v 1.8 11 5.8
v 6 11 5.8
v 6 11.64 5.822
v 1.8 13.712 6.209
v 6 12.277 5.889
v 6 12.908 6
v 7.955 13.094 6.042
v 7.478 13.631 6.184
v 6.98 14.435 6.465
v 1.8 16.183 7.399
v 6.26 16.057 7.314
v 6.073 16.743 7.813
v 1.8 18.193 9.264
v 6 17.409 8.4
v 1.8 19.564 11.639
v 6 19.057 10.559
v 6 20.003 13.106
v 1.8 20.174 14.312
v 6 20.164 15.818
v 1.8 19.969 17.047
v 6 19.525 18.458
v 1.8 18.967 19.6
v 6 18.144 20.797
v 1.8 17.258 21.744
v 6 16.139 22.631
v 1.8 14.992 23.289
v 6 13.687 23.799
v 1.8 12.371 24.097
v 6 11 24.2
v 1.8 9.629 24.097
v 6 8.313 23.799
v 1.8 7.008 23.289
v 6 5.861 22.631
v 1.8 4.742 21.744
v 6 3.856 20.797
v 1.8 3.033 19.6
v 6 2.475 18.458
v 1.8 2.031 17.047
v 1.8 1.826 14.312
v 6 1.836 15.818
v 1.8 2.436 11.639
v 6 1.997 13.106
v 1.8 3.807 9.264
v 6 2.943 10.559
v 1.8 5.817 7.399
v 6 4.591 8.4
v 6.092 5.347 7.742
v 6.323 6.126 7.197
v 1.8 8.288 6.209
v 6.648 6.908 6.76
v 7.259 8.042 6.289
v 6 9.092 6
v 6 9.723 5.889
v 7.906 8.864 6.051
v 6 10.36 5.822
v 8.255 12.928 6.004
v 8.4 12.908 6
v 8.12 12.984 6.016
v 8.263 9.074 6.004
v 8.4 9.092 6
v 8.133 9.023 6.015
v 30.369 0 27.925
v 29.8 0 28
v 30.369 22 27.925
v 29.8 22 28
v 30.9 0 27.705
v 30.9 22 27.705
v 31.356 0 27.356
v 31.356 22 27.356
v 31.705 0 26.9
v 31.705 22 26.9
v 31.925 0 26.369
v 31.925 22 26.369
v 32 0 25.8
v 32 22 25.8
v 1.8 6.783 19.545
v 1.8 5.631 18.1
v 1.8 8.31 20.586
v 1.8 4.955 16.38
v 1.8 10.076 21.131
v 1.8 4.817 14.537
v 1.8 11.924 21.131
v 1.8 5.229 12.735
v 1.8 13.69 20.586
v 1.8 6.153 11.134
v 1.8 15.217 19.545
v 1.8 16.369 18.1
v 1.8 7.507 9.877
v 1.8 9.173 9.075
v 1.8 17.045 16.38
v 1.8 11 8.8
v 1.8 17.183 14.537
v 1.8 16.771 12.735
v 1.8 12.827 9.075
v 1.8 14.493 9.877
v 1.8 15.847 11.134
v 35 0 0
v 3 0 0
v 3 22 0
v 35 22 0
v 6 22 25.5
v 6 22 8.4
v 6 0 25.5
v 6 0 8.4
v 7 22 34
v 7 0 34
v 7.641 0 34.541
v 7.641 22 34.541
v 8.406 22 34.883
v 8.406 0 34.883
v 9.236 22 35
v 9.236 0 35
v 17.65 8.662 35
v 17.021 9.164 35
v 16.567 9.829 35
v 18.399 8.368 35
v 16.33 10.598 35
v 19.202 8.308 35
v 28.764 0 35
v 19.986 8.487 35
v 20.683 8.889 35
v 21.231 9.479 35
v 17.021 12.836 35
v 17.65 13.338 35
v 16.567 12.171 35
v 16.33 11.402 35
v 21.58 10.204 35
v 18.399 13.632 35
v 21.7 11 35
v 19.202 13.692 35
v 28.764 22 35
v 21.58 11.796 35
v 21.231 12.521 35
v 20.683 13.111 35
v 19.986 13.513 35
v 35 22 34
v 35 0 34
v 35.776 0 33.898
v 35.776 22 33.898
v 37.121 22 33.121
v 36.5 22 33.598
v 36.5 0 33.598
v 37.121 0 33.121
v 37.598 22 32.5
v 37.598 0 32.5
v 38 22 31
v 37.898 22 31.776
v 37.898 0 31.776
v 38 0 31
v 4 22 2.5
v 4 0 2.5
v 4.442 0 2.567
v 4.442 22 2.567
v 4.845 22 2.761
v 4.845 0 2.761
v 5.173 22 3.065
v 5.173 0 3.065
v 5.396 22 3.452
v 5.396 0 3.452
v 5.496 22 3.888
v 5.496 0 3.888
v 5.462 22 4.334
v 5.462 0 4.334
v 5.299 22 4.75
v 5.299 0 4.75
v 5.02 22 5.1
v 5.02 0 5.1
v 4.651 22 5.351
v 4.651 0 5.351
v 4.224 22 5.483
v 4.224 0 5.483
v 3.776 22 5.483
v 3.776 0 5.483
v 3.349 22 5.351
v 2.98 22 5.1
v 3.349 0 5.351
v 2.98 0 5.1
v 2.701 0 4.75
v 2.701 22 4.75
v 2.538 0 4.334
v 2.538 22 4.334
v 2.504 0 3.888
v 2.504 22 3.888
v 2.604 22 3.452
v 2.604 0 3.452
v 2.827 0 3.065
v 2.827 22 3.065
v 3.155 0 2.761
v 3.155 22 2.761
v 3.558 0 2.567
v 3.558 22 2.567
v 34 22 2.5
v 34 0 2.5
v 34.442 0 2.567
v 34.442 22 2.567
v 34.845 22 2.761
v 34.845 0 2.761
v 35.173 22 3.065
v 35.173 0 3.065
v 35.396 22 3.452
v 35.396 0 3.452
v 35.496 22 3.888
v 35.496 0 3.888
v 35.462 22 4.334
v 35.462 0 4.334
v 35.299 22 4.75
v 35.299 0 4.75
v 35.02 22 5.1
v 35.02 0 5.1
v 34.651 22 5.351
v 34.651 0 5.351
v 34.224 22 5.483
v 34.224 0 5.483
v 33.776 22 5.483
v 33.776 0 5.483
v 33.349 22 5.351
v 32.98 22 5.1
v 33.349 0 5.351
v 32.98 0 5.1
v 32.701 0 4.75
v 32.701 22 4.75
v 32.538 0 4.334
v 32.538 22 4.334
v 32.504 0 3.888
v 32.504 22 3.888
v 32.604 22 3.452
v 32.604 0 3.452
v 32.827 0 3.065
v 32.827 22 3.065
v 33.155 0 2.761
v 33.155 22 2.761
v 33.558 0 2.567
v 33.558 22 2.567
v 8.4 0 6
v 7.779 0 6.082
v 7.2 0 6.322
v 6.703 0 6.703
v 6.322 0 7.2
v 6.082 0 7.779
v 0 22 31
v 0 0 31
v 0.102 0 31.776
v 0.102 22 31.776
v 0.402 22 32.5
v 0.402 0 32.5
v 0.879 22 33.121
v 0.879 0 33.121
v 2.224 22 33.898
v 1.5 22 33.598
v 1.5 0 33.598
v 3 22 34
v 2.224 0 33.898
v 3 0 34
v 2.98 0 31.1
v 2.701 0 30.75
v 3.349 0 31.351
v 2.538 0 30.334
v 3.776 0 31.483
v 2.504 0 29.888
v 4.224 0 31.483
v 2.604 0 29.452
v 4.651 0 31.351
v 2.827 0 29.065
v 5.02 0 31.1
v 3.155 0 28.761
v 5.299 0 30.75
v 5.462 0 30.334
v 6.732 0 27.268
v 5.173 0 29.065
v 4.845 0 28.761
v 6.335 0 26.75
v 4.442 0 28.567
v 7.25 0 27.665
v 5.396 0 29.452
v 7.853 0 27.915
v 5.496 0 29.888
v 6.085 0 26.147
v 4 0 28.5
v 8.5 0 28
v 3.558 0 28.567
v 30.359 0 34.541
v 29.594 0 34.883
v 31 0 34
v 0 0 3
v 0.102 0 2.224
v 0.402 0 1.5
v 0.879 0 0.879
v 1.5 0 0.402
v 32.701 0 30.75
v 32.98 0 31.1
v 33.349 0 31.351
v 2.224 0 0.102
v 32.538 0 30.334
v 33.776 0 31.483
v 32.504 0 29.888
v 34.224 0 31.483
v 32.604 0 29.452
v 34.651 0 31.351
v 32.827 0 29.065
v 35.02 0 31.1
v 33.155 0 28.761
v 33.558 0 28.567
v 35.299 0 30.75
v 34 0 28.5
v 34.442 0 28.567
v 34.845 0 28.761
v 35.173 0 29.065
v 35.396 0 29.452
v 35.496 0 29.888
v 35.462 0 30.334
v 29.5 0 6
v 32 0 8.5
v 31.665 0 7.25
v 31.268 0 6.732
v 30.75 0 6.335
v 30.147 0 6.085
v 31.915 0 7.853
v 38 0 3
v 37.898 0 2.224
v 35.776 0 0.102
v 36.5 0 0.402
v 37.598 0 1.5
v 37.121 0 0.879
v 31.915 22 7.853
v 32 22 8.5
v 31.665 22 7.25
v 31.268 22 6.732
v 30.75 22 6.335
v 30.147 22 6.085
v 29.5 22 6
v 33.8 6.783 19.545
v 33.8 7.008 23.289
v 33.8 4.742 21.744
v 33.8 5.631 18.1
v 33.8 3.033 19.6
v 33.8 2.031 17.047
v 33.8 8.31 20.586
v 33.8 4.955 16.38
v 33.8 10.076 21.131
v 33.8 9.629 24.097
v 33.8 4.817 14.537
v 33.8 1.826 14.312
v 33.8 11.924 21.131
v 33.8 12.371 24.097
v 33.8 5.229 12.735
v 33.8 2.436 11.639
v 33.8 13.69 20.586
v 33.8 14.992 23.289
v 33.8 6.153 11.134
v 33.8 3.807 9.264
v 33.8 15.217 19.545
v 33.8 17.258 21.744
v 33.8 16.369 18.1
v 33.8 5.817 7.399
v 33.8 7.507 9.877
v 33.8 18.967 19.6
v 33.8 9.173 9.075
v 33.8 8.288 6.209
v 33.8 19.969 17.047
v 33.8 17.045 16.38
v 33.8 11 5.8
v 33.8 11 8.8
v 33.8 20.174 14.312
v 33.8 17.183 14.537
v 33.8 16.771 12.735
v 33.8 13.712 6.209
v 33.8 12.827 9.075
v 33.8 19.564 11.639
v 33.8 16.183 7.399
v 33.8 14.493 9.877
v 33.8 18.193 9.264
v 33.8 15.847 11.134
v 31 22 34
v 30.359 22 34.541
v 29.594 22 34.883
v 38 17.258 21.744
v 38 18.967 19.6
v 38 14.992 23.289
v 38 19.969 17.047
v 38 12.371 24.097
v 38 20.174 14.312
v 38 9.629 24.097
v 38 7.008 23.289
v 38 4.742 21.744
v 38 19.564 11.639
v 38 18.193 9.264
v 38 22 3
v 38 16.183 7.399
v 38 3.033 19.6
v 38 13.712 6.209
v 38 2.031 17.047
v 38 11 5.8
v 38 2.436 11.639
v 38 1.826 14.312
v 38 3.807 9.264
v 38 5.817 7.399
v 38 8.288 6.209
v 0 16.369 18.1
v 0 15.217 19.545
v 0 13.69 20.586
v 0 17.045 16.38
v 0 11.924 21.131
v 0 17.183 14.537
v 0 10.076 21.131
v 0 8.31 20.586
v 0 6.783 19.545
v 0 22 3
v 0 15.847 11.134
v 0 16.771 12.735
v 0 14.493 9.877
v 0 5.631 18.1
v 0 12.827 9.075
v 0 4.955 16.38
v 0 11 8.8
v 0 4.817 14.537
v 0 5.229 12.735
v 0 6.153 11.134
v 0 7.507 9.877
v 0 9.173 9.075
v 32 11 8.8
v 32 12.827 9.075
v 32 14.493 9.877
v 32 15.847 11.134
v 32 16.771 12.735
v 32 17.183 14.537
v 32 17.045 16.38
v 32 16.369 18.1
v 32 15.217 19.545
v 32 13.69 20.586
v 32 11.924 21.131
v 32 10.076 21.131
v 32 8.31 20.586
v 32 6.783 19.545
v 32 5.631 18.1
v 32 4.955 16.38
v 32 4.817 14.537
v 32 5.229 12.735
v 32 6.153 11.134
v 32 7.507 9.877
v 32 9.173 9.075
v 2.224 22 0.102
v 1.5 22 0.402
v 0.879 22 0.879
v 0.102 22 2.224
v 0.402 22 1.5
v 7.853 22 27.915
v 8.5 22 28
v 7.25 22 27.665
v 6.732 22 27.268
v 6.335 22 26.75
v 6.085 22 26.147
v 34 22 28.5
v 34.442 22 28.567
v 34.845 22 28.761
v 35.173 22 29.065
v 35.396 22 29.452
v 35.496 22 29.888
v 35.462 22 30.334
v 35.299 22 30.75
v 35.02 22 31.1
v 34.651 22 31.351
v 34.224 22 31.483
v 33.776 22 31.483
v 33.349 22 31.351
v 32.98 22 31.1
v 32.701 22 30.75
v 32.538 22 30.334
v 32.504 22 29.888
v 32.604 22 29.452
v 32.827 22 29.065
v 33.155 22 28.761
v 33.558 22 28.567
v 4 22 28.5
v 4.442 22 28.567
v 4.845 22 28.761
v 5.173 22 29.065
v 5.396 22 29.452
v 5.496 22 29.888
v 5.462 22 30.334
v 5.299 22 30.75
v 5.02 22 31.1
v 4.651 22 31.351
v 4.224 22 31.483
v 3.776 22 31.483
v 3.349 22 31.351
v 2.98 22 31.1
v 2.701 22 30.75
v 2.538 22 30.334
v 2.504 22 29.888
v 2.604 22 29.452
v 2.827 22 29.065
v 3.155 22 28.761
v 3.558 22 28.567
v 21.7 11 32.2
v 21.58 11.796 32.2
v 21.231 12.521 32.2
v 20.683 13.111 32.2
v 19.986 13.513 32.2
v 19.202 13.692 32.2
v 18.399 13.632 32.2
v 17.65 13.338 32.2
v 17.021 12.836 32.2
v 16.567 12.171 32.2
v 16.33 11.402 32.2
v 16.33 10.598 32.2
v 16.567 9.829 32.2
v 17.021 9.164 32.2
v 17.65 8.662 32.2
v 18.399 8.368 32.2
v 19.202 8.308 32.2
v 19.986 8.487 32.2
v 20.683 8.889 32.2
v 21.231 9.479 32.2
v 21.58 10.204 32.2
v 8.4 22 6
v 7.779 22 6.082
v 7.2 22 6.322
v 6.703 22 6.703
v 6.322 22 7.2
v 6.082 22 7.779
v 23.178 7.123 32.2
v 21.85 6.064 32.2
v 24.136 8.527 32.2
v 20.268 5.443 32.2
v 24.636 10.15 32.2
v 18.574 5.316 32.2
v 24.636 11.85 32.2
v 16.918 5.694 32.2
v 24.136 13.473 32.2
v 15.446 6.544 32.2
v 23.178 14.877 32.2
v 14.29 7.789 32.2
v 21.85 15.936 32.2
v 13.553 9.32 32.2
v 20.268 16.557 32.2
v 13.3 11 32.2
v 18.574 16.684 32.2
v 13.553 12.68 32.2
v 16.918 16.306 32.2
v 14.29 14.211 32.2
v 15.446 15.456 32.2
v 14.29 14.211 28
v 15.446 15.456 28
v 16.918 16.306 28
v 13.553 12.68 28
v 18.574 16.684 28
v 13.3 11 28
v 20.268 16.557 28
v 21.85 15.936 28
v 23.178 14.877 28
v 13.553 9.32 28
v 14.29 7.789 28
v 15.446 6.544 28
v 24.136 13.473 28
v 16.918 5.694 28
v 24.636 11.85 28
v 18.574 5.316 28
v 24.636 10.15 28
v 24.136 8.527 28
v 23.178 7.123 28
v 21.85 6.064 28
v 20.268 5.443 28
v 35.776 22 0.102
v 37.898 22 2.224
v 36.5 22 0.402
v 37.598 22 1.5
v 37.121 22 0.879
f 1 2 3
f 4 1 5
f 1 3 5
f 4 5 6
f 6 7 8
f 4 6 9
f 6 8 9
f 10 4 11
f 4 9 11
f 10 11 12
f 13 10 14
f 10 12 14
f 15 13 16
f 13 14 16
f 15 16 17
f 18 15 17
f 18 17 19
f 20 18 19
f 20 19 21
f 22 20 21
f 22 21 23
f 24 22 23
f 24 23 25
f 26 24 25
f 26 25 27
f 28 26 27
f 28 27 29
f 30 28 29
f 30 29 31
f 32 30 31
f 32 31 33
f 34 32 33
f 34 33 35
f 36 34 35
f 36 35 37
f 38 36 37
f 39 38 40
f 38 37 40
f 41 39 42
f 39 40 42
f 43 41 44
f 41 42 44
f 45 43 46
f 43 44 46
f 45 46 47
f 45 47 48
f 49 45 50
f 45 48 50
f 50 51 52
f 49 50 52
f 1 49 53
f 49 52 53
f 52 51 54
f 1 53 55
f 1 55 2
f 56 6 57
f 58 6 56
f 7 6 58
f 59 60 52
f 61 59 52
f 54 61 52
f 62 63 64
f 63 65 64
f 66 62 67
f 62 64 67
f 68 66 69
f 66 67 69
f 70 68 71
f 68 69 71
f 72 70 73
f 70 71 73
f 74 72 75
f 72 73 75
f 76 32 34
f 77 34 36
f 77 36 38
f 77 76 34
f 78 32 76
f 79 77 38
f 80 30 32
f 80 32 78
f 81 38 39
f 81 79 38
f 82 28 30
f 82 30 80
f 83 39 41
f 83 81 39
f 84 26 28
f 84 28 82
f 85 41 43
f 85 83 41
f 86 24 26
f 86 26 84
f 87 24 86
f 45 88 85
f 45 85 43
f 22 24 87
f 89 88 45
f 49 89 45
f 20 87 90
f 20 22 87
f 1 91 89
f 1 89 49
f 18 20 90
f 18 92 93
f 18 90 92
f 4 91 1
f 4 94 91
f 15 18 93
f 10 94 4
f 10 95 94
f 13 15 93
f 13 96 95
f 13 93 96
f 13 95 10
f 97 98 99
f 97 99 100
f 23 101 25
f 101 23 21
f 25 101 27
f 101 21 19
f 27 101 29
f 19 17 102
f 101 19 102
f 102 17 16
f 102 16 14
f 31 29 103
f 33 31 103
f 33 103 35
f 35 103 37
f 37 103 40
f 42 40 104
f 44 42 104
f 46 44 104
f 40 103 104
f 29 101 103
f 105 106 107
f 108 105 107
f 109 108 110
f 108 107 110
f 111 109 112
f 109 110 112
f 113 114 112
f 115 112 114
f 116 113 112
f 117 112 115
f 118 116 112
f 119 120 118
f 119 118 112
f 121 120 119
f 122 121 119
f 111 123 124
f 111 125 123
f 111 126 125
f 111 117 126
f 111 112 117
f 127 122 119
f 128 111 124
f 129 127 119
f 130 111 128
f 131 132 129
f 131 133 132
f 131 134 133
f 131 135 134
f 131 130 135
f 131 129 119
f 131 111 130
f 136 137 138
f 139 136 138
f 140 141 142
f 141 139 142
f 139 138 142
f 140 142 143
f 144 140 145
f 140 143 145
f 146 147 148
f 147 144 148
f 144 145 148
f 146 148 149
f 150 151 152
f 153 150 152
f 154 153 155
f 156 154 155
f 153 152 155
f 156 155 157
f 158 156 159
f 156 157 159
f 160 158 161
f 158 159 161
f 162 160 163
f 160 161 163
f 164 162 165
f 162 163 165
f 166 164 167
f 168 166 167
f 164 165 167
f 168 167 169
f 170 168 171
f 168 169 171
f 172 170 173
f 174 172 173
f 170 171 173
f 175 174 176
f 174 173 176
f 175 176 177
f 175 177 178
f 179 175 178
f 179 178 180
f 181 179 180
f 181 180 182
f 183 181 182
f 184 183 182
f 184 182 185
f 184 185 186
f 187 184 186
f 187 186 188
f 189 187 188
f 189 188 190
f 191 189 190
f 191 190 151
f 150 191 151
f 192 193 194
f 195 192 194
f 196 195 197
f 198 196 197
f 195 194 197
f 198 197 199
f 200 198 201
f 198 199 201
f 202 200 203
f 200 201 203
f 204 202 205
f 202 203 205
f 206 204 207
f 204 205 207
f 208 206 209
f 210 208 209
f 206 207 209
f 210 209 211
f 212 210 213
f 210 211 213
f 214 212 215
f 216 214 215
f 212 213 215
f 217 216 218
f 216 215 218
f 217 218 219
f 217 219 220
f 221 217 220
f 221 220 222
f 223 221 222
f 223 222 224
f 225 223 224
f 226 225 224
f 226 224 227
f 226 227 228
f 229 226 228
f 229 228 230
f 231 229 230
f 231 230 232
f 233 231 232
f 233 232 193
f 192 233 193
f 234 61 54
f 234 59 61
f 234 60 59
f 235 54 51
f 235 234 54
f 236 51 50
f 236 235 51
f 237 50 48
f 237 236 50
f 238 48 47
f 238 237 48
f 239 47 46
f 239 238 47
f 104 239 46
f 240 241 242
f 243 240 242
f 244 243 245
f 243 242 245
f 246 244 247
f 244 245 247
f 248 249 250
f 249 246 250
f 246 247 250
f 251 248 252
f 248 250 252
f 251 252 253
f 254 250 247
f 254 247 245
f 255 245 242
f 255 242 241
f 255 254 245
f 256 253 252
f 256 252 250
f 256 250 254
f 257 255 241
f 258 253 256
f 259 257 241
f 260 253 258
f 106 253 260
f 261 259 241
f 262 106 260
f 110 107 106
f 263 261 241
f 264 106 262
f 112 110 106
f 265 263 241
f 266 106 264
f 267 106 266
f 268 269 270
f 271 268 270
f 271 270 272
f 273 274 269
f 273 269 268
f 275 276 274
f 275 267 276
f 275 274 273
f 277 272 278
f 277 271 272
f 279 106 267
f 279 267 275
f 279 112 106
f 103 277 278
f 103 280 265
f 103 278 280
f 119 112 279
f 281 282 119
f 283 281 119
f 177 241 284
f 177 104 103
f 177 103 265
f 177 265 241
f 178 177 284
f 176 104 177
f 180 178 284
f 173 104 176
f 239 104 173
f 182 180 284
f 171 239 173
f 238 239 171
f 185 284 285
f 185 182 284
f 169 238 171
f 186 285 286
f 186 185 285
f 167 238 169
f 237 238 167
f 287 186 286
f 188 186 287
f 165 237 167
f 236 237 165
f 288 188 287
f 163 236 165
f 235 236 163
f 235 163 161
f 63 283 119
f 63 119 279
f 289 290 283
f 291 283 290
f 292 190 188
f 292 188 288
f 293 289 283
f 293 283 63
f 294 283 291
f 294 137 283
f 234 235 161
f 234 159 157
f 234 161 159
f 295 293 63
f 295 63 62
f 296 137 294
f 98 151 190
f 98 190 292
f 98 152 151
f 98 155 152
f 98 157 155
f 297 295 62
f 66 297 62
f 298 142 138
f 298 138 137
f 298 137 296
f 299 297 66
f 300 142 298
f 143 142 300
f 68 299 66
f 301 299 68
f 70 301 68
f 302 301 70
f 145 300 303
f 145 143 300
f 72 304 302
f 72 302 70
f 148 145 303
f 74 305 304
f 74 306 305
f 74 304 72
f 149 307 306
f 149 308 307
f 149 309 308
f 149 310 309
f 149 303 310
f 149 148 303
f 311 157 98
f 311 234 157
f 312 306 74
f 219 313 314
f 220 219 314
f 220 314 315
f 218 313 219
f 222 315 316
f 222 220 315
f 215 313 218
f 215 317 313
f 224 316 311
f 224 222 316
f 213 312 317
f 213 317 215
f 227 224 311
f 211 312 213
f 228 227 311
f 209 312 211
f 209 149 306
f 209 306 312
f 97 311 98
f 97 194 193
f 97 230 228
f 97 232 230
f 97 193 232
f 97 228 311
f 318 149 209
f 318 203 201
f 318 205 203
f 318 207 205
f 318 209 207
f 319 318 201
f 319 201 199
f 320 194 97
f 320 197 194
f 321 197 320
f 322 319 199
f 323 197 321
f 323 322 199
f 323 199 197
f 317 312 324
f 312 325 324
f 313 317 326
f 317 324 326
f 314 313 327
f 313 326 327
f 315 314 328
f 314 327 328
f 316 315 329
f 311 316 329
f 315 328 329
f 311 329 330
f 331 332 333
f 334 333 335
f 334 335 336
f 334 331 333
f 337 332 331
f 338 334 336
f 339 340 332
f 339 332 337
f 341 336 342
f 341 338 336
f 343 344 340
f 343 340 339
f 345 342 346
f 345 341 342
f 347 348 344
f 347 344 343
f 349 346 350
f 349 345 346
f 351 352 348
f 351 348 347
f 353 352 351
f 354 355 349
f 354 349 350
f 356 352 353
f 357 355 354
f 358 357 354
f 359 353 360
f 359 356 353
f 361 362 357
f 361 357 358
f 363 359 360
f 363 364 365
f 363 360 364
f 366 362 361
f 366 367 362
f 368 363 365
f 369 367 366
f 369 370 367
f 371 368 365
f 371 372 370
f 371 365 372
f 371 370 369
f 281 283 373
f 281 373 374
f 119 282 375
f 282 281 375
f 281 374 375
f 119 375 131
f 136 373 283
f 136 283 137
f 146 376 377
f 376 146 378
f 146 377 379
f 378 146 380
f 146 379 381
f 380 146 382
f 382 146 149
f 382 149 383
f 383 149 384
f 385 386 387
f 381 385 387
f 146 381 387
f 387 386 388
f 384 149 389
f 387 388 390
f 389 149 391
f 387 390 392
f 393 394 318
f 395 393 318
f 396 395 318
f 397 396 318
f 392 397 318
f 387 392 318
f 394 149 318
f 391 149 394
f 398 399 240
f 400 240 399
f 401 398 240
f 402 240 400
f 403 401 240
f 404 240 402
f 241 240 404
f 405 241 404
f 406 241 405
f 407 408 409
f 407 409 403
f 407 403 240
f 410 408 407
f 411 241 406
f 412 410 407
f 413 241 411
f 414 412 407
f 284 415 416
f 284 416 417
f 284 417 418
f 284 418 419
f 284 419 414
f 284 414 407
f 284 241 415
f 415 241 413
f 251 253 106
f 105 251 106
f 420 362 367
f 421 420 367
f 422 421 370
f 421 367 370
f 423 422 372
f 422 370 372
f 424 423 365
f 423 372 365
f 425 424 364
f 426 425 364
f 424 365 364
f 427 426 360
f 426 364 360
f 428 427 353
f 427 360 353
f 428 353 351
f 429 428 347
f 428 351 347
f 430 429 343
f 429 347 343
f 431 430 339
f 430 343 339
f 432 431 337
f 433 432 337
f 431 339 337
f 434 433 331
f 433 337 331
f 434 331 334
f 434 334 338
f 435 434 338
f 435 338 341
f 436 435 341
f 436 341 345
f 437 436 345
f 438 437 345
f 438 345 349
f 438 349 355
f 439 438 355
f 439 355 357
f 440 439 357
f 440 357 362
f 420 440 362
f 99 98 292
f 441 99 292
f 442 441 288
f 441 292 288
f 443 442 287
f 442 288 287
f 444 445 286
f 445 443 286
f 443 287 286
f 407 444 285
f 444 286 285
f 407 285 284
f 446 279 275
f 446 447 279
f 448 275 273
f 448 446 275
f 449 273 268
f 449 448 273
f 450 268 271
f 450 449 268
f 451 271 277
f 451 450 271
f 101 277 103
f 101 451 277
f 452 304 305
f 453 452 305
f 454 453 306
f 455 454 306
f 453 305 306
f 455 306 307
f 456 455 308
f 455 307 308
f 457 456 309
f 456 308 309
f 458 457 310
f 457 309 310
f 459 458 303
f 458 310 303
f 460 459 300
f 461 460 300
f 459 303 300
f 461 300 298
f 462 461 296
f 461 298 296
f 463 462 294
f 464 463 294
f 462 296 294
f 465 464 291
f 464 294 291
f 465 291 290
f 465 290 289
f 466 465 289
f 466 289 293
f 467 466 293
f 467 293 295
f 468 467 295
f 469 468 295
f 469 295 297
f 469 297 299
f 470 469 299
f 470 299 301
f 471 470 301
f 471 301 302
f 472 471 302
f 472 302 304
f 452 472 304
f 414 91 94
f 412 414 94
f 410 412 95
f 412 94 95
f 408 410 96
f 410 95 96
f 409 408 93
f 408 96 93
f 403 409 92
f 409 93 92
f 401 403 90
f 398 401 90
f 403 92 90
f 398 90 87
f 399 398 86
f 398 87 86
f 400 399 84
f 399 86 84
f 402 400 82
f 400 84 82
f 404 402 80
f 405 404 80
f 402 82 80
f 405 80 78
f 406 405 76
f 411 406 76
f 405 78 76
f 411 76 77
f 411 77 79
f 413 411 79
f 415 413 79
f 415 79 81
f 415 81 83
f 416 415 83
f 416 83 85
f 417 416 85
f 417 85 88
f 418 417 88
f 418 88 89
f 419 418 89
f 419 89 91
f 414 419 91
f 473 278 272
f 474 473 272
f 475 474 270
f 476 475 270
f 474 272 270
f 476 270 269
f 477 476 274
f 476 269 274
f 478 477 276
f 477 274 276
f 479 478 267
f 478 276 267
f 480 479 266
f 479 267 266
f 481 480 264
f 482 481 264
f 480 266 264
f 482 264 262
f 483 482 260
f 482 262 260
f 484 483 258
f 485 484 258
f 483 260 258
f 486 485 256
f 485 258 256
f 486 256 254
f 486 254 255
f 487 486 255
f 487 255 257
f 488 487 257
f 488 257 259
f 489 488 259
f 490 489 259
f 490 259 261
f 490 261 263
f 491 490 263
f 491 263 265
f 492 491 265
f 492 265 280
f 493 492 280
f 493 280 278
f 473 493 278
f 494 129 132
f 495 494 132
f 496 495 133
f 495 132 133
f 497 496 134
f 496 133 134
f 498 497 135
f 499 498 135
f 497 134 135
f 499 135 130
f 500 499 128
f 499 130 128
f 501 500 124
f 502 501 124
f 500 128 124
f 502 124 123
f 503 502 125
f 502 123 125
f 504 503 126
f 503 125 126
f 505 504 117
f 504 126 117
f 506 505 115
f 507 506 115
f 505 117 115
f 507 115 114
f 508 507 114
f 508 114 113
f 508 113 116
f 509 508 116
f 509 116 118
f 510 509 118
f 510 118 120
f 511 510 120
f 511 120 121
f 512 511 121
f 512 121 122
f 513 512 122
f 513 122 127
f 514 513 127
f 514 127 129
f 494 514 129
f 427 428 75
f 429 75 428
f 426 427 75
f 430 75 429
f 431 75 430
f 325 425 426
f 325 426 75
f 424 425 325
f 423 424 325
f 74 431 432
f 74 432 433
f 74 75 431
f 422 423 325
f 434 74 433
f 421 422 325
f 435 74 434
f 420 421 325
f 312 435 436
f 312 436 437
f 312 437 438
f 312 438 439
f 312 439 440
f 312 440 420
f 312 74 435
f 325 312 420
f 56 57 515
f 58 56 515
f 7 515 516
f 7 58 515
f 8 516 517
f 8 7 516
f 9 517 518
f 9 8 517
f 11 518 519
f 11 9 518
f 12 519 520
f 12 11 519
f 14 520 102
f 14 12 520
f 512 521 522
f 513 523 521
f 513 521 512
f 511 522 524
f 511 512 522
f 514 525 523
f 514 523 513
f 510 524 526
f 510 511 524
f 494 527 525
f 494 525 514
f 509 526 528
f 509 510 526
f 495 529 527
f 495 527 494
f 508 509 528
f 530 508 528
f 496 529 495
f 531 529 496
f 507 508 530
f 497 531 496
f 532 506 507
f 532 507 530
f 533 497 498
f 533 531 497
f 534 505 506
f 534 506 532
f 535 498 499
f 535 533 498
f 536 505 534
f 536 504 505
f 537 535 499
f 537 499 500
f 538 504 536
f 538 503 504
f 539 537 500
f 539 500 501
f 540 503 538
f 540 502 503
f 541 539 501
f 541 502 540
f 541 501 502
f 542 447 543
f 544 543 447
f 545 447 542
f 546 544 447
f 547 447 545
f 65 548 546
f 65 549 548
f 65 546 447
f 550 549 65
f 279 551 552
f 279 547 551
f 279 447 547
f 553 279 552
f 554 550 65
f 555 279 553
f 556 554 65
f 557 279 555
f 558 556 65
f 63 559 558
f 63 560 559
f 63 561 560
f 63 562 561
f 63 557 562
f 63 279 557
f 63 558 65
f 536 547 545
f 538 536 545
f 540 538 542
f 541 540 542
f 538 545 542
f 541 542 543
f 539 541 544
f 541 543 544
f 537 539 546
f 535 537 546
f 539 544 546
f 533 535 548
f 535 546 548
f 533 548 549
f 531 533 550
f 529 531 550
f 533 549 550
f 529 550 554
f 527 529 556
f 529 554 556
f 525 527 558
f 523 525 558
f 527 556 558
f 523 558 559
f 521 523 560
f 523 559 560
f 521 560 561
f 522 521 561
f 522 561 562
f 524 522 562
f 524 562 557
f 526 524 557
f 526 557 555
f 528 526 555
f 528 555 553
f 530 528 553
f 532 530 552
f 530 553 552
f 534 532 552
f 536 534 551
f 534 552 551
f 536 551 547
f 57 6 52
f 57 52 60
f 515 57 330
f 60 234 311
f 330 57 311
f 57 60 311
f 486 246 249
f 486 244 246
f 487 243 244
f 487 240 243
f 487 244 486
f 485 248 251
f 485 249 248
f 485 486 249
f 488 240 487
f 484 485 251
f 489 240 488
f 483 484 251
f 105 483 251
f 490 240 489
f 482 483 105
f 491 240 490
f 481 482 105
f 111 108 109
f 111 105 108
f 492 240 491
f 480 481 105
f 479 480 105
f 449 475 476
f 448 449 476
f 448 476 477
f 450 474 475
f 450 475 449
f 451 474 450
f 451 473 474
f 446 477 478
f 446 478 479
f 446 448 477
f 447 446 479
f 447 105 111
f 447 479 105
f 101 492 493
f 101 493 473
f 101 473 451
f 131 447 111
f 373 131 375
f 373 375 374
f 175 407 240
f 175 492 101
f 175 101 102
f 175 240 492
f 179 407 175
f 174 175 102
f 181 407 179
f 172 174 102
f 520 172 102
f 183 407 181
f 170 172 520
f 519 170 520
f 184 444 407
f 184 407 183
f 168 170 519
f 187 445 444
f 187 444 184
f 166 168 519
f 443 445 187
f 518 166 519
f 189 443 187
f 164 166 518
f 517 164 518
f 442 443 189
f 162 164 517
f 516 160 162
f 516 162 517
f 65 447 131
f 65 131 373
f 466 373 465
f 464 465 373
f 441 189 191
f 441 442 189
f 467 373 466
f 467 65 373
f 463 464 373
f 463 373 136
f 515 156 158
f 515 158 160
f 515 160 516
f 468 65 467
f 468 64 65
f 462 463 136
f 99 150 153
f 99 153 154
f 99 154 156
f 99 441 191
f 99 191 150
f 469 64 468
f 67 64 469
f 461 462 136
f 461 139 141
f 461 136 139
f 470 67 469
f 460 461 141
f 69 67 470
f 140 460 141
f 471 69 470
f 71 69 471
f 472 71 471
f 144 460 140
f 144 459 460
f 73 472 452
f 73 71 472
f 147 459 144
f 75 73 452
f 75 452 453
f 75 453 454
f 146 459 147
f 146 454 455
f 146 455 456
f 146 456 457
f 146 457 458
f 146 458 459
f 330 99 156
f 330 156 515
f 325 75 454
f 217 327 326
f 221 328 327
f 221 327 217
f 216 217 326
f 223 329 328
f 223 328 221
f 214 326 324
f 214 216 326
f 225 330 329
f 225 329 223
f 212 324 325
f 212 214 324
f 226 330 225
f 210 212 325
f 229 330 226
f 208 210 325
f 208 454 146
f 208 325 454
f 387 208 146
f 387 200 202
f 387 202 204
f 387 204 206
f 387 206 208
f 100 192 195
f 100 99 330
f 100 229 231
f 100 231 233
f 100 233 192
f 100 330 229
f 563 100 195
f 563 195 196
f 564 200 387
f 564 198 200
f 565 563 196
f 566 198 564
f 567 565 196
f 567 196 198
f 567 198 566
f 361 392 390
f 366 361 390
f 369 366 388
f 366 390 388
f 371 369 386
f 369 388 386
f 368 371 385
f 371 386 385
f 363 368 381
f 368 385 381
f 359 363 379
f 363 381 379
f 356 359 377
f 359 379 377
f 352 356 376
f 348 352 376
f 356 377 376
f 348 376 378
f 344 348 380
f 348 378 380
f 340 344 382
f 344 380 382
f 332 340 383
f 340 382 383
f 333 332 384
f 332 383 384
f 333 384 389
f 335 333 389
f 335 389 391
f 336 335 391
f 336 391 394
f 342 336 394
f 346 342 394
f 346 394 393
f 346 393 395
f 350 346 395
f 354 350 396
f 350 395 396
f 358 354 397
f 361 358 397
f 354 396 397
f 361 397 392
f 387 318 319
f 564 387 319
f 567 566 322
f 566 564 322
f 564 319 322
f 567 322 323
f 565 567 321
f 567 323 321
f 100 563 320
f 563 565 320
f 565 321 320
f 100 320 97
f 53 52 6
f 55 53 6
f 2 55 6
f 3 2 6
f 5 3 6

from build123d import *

# Parameters (mm, degrees)
SKETCH3_W           = 38
SKETCH3_H           = 34
SKETCH3_W_2         = 26
SKETCH3_H_2         = 22
BOSS_EXTRUDE1_DEPTH = 22
SKETCH4_W           = 24
SKETCH4_H           = 22
BOSS_EXTRUDE2_DEPTH = 1
SKETCH5_R           = 2.7
CUT_EXTRUDE1_DEPTH  = 12
SKETCH7_R           = 5.7
CUT_EXTRUDE3_DEPTH  = 4.2
SKETCH8_R           = 6.2
CUT_EXTRUDE4_DEPTH  = 57.151580565
SKETCH9_R           = 9.2
CUT_EXTRUDE5_DEPTH  = 4.2
SKETCH10_R          = 9.2
CUT_EXTRUDE6_DEPTH  = 4.2
SKETCH15_R          = 1.5
CUT_EXTRUDE7_DEPTH  = 57.151580565
FILLET1_R           = 3
FILLET3_R           = 2.5
FILLET4_R           = 2.2
FILLET5_R           = 2.4


with BuildPart() as part:
    # Sketch3 → Boss-Extrude1 (new body)
    with BuildSketch(Plane(origin=(0, 0, 0), x_dir=(1, 0, 0), z_dir=(0, 1, 0))):
        with Locations((19, -17)):
            Rectangle(SKETCH3_W, SKETCH3_H)
        with Locations((19, -17)):
            Rectangle(SKETCH3_W_2, SKETCH3_H_2, mode=Mode.SUBTRACT)
    extrude(amount=BOSS_EXTRUDE1_DEPTH)

    # Sketch4 → Boss-Extrude2 (add)
    with BuildSketch(Plane.XY.offset(34)):
        with Locations((19, 11)):
            Rectangle(SKETCH4_W, SKETCH4_H)
    extrude(amount=BOSS_EXTRUDE2_DEPTH)

    # Sketch5 → Cut-Extrude1 (cut)
    with BuildSketch(Plane.XY.offset(35)):
        with Locations((19, 11)):
            Circle(SKETCH5_R)
    extrude(amount=-CUT_EXTRUDE1_DEPTH, mode=Mode.SUBTRACT)

    # Sketch7 → Cut-Extrude3 (cut)
    with BuildSketch(Plane(origin=(0, 0, 28), x_dir=(-1, 0, 0), z_dir=(0, 0, -1))):
        with Locations((-19, 11)):
            Circle(SKETCH7_R)
    extrude(amount=-CUT_EXTRUDE3_DEPTH, mode=Mode.SUBTRACT)

    # Sketch8 → Cut-Extrude4 (cut, through all)
    with BuildSketch(Plane(origin=(38, 0, 0), x_dir=(0, 0, -1), z_dir=(1, 0, 0))):
        with Locations((-15, 11)):
            Circle(SKETCH8_R)
    extrude(amount=-CUT_EXTRUDE4_DEPTH, mode=Mode.SUBTRACT)

    # Sketch9 → Cut-Extrude5 (cut)
    with BuildSketch(Plane(origin=(6, 0, 0), x_dir=(0, 0, -1), z_dir=(1, 0, 0))):
        with Locations((-15, 11)):
            Circle(SKETCH9_R)
    extrude(amount=-CUT_EXTRUDE5_DEPTH, mode=Mode.SUBTRACT)

    # Sketch10 → Cut-Extrude6 (cut)
    with BuildSketch(Plane(origin=(38, 0, 0), x_dir=(0, 0, -1), z_dir=(1, 0, 0))):
        with Locations((-15, 11)):
            Circle(SKETCH10_R)
    extrude(amount=-CUT_EXTRUDE6_DEPTH, mode=Mode.SUBTRACT)

    # Sketch15 → Cut-Extrude7 (cut, through all)
    with BuildSketch(Plane(origin=(0, 0, 0), x_dir=(-1, 0, 0), z_dir=(0, -1, 0))):
        with Locations(Location((-4, -30, 0), (0, 0, 90))):
            Circle(SKETCH15_R)
        with Locations(Location((-34, -30, 0), (0, 0, 90))):
            Circle(SKETCH15_R)
        with Locations(Location((-34, -4, 0), (0, 0, 90))):
            Circle(SKETCH15_R)
        with Locations(Location((-4, -4, 0), (0, 0, 90))):
            Circle(SKETCH15_R)
    extrude(amount=-CUT_EXTRUDE7_DEPTH, mode=Mode.SUBTRACT)

    # Fillet1
    # the kernel refuses this fillet: 3 mm, written as the material it takes off along each edge
    with BuildSketch(Plane(origin=(38, -7.5, 0), x_dir=(-1, 0, 0), z_dir=(0, 1, 0)), Plane(origin=(38, -7.5, 34), x_dir=(0, 0, -1), z_dir=(0, 1, 0))) as fillet1_piece_1:
        with BuildLine():
            CenterArc((FILLET1_R, FILLET1_R), FILLET1_R, 180, 90)
            Line((0, FILLET1_R), (-FILLET1_R * 0.02, FILLET1_R))
            Line((-FILLET1_R * 0.02, FILLET1_R), (-FILLET1_R * 0.02, -FILLET1_R * 0.02))
            Line((-FILLET1_R * 0.02, -FILLET1_R * 0.02), (FILLET1_R, -FILLET1_R * 0.02))
            Line((FILLET1_R, -FILLET1_R * 0.02), (FILLET1_R, 0))
        make_face()
    extrude(amount=37, mode=Mode.SUBTRACT)
    with BuildSketch(Plane(origin=(7, -5.590169944, 35), x_dir=(0, 0, -1), z_dir=(0, 1, 0)), Plane(origin=(31, 27.590169944, 35), x_dir=(0, 0, -1), z_dir=(0, -1, 0))) as fillet1_piece_2:
        with BuildLine():
            CenterArc((3, -2.236067977), FILLET1_R, 131.810314896, 48.189685104)
            Line((0, -2.236067977), (-0.06, -2.236067977))
            Line((-0.06, -2.236067977), (-0.06, 0))
            Line((-0.06, 0), (0, 0.06))
            ThreePointArc((0, 0.06), (0.5, 0.06), (0.96, 0.04472136))
            Line((0.96, 0.04472136), (1, 0))
        make_face()
    extrude(amount=33.180339887, mode=Mode.SUBTRACT)
    with BuildSketch(Plane(origin=(0, -7.5, 34), x_dir=(0, 0, -1), z_dir=(0, 1, 0)), Plane(origin=(0, -7.5, 0), x_dir=(1, 0, 0), z_dir=(0, 1, 0))) as fillet1_piece_3:
        with BuildLine():
            CenterArc((FILLET1_R, -FILLET1_R), FILLET1_R, 90, 90)
            Line((0, -FILLET1_R), (-FILLET1_R * 0.02, -FILLET1_R))
            Line((-FILLET1_R * 0.02, -FILLET1_R), (-FILLET1_R * 0.02, FILLET1_R * 0.02))
            Line((-FILLET1_R * 0.02, FILLET1_R * 0.02), (FILLET1_R, FILLET1_R * 0.02))
            Line((FILLET1_R, FILLET1_R * 0.02), (FILLET1_R, 0))
        make_face()
    extrude(amount=37, mode=Mode.SUBTRACT)

    # Fillet3
    fillet3_edges = [part.edges().sort_by_distance(p)[0] for p in [
        (6, 11, 28),
        (32, 11, 6),
    ]]
    fillet(fillet3_edges, radius=FILLET3_R)

    # Fillet4
    fillet4_edges = [part.edges().sort_by_distance(p)[0] for p in [
        (32, 11, 28),
    ]]
    fillet(fillet4_edges, radius=FILLET4_R)

    # Fillet5
    # the kernel refuses this fillet: 2.4 mm, written as the material it adds along each edge
    with BuildSketch(Plane(origin=(6, 6.907878403, 6), x_dir=(0, 0, 1), z_dir=(0, 1, 0))) as fillet5_piece_1_section:
        with BuildLine():
            CenterArc((FILLET5_R, FILLET5_R), FILLET5_R, 180, 90)
            Line((0, FILLET5_R), (0, 0))
            Line((0, 0), (FILLET5_R, 0))
        make_face()
    fillet5_piece_1 = extrude(amount=15.092121597, mode=Mode.PRIVATE)
    fillet5_piece_1 = fillet5_piece_1 - Plane(origin=(6.778295216, 11, 15), x_dir=(0, 0, -1), z_dir=(1, 0, 0)) * Cylinder(9.2, 40, mode=Mode.PRIVATE)
    add(fillet5_piece_1)
    with BuildSketch(Plane(origin=(6, 0, 6), x_dir=(0, 0, 1), z_dir=(0, 1, 0))) as fillet5_piece_2_section:
        with BuildLine():
            CenterArc((FILLET5_R, FILLET5_R), FILLET5_R, 180, 90)
            Line((0, FILLET5_R), (0, 0))
            Line((0, 0), (FILLET5_R, 0))
        make_face()
    fillet5_piece_2 = extrude(amount=15.092121597, mode=Mode.PRIVATE)
    fillet5_piece_2 = fillet5_piece_2 - Plane(origin=(6.572967992, 11, 15), x_dir=(0, 0, -1), z_dir=(1, 0, 0)) * Cylinder(9.2, 40, mode=Mode.PRIVATE)
    add(fillet5_piece_2)


solid = part.part
